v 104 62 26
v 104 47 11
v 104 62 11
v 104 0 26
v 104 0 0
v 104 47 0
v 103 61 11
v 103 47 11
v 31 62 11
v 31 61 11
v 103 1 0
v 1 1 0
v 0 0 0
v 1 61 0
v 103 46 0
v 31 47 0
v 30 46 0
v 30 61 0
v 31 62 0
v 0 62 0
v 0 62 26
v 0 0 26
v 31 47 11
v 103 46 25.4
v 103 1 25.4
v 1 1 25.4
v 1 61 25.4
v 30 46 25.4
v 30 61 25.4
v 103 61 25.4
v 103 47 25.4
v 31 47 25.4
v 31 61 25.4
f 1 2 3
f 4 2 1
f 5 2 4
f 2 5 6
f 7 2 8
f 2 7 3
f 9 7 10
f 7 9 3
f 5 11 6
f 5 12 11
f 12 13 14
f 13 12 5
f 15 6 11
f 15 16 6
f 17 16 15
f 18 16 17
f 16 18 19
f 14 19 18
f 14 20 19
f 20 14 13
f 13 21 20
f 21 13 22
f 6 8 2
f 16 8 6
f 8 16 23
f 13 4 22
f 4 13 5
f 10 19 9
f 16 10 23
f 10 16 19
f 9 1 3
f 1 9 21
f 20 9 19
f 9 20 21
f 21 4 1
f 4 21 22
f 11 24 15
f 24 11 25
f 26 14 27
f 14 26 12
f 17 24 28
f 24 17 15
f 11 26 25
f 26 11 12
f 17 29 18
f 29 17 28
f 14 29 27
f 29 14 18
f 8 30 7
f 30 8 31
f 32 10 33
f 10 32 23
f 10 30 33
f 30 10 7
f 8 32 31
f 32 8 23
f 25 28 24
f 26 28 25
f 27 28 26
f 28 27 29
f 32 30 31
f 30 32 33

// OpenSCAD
//horizontal piece
X1 = 104; 
Y1 = 47;

//verical piece
X2 = 31;
Y2 = Y1+15;

//union of two
X3 = X1;
Y3 = Y2;


Z1 = 11;
Z2 = 26-Z1;

WALL= 1;
DWALL = 2*WALL;

module shape(){
    cube([X1,Y1,Z1]);
    cube([X2,Y2,Z1]);
    translate([0,0,Z1])
        cube([X3,Y3,Z2]);
}

module cutout(){
    color("red"){
        translate([WALL,WALL,0]){
            cube([X1-DWALL,Y1-DWALL,Z1+Z2]);
            cube([X2-DWALL,Y2-DWALL,Z1+Z2]);
        }
    }
    color("blue"){
        translate([X2,Y1,Z1])
        cube([X1-X2-WALL,Y2-Y1-WALL,Z2]);
        
    }
}

translate([0,0,Z1+Z2-0.6])
    cube([X3,Y3,0.6]);

difference(){
    shape();
    cutout();
}
